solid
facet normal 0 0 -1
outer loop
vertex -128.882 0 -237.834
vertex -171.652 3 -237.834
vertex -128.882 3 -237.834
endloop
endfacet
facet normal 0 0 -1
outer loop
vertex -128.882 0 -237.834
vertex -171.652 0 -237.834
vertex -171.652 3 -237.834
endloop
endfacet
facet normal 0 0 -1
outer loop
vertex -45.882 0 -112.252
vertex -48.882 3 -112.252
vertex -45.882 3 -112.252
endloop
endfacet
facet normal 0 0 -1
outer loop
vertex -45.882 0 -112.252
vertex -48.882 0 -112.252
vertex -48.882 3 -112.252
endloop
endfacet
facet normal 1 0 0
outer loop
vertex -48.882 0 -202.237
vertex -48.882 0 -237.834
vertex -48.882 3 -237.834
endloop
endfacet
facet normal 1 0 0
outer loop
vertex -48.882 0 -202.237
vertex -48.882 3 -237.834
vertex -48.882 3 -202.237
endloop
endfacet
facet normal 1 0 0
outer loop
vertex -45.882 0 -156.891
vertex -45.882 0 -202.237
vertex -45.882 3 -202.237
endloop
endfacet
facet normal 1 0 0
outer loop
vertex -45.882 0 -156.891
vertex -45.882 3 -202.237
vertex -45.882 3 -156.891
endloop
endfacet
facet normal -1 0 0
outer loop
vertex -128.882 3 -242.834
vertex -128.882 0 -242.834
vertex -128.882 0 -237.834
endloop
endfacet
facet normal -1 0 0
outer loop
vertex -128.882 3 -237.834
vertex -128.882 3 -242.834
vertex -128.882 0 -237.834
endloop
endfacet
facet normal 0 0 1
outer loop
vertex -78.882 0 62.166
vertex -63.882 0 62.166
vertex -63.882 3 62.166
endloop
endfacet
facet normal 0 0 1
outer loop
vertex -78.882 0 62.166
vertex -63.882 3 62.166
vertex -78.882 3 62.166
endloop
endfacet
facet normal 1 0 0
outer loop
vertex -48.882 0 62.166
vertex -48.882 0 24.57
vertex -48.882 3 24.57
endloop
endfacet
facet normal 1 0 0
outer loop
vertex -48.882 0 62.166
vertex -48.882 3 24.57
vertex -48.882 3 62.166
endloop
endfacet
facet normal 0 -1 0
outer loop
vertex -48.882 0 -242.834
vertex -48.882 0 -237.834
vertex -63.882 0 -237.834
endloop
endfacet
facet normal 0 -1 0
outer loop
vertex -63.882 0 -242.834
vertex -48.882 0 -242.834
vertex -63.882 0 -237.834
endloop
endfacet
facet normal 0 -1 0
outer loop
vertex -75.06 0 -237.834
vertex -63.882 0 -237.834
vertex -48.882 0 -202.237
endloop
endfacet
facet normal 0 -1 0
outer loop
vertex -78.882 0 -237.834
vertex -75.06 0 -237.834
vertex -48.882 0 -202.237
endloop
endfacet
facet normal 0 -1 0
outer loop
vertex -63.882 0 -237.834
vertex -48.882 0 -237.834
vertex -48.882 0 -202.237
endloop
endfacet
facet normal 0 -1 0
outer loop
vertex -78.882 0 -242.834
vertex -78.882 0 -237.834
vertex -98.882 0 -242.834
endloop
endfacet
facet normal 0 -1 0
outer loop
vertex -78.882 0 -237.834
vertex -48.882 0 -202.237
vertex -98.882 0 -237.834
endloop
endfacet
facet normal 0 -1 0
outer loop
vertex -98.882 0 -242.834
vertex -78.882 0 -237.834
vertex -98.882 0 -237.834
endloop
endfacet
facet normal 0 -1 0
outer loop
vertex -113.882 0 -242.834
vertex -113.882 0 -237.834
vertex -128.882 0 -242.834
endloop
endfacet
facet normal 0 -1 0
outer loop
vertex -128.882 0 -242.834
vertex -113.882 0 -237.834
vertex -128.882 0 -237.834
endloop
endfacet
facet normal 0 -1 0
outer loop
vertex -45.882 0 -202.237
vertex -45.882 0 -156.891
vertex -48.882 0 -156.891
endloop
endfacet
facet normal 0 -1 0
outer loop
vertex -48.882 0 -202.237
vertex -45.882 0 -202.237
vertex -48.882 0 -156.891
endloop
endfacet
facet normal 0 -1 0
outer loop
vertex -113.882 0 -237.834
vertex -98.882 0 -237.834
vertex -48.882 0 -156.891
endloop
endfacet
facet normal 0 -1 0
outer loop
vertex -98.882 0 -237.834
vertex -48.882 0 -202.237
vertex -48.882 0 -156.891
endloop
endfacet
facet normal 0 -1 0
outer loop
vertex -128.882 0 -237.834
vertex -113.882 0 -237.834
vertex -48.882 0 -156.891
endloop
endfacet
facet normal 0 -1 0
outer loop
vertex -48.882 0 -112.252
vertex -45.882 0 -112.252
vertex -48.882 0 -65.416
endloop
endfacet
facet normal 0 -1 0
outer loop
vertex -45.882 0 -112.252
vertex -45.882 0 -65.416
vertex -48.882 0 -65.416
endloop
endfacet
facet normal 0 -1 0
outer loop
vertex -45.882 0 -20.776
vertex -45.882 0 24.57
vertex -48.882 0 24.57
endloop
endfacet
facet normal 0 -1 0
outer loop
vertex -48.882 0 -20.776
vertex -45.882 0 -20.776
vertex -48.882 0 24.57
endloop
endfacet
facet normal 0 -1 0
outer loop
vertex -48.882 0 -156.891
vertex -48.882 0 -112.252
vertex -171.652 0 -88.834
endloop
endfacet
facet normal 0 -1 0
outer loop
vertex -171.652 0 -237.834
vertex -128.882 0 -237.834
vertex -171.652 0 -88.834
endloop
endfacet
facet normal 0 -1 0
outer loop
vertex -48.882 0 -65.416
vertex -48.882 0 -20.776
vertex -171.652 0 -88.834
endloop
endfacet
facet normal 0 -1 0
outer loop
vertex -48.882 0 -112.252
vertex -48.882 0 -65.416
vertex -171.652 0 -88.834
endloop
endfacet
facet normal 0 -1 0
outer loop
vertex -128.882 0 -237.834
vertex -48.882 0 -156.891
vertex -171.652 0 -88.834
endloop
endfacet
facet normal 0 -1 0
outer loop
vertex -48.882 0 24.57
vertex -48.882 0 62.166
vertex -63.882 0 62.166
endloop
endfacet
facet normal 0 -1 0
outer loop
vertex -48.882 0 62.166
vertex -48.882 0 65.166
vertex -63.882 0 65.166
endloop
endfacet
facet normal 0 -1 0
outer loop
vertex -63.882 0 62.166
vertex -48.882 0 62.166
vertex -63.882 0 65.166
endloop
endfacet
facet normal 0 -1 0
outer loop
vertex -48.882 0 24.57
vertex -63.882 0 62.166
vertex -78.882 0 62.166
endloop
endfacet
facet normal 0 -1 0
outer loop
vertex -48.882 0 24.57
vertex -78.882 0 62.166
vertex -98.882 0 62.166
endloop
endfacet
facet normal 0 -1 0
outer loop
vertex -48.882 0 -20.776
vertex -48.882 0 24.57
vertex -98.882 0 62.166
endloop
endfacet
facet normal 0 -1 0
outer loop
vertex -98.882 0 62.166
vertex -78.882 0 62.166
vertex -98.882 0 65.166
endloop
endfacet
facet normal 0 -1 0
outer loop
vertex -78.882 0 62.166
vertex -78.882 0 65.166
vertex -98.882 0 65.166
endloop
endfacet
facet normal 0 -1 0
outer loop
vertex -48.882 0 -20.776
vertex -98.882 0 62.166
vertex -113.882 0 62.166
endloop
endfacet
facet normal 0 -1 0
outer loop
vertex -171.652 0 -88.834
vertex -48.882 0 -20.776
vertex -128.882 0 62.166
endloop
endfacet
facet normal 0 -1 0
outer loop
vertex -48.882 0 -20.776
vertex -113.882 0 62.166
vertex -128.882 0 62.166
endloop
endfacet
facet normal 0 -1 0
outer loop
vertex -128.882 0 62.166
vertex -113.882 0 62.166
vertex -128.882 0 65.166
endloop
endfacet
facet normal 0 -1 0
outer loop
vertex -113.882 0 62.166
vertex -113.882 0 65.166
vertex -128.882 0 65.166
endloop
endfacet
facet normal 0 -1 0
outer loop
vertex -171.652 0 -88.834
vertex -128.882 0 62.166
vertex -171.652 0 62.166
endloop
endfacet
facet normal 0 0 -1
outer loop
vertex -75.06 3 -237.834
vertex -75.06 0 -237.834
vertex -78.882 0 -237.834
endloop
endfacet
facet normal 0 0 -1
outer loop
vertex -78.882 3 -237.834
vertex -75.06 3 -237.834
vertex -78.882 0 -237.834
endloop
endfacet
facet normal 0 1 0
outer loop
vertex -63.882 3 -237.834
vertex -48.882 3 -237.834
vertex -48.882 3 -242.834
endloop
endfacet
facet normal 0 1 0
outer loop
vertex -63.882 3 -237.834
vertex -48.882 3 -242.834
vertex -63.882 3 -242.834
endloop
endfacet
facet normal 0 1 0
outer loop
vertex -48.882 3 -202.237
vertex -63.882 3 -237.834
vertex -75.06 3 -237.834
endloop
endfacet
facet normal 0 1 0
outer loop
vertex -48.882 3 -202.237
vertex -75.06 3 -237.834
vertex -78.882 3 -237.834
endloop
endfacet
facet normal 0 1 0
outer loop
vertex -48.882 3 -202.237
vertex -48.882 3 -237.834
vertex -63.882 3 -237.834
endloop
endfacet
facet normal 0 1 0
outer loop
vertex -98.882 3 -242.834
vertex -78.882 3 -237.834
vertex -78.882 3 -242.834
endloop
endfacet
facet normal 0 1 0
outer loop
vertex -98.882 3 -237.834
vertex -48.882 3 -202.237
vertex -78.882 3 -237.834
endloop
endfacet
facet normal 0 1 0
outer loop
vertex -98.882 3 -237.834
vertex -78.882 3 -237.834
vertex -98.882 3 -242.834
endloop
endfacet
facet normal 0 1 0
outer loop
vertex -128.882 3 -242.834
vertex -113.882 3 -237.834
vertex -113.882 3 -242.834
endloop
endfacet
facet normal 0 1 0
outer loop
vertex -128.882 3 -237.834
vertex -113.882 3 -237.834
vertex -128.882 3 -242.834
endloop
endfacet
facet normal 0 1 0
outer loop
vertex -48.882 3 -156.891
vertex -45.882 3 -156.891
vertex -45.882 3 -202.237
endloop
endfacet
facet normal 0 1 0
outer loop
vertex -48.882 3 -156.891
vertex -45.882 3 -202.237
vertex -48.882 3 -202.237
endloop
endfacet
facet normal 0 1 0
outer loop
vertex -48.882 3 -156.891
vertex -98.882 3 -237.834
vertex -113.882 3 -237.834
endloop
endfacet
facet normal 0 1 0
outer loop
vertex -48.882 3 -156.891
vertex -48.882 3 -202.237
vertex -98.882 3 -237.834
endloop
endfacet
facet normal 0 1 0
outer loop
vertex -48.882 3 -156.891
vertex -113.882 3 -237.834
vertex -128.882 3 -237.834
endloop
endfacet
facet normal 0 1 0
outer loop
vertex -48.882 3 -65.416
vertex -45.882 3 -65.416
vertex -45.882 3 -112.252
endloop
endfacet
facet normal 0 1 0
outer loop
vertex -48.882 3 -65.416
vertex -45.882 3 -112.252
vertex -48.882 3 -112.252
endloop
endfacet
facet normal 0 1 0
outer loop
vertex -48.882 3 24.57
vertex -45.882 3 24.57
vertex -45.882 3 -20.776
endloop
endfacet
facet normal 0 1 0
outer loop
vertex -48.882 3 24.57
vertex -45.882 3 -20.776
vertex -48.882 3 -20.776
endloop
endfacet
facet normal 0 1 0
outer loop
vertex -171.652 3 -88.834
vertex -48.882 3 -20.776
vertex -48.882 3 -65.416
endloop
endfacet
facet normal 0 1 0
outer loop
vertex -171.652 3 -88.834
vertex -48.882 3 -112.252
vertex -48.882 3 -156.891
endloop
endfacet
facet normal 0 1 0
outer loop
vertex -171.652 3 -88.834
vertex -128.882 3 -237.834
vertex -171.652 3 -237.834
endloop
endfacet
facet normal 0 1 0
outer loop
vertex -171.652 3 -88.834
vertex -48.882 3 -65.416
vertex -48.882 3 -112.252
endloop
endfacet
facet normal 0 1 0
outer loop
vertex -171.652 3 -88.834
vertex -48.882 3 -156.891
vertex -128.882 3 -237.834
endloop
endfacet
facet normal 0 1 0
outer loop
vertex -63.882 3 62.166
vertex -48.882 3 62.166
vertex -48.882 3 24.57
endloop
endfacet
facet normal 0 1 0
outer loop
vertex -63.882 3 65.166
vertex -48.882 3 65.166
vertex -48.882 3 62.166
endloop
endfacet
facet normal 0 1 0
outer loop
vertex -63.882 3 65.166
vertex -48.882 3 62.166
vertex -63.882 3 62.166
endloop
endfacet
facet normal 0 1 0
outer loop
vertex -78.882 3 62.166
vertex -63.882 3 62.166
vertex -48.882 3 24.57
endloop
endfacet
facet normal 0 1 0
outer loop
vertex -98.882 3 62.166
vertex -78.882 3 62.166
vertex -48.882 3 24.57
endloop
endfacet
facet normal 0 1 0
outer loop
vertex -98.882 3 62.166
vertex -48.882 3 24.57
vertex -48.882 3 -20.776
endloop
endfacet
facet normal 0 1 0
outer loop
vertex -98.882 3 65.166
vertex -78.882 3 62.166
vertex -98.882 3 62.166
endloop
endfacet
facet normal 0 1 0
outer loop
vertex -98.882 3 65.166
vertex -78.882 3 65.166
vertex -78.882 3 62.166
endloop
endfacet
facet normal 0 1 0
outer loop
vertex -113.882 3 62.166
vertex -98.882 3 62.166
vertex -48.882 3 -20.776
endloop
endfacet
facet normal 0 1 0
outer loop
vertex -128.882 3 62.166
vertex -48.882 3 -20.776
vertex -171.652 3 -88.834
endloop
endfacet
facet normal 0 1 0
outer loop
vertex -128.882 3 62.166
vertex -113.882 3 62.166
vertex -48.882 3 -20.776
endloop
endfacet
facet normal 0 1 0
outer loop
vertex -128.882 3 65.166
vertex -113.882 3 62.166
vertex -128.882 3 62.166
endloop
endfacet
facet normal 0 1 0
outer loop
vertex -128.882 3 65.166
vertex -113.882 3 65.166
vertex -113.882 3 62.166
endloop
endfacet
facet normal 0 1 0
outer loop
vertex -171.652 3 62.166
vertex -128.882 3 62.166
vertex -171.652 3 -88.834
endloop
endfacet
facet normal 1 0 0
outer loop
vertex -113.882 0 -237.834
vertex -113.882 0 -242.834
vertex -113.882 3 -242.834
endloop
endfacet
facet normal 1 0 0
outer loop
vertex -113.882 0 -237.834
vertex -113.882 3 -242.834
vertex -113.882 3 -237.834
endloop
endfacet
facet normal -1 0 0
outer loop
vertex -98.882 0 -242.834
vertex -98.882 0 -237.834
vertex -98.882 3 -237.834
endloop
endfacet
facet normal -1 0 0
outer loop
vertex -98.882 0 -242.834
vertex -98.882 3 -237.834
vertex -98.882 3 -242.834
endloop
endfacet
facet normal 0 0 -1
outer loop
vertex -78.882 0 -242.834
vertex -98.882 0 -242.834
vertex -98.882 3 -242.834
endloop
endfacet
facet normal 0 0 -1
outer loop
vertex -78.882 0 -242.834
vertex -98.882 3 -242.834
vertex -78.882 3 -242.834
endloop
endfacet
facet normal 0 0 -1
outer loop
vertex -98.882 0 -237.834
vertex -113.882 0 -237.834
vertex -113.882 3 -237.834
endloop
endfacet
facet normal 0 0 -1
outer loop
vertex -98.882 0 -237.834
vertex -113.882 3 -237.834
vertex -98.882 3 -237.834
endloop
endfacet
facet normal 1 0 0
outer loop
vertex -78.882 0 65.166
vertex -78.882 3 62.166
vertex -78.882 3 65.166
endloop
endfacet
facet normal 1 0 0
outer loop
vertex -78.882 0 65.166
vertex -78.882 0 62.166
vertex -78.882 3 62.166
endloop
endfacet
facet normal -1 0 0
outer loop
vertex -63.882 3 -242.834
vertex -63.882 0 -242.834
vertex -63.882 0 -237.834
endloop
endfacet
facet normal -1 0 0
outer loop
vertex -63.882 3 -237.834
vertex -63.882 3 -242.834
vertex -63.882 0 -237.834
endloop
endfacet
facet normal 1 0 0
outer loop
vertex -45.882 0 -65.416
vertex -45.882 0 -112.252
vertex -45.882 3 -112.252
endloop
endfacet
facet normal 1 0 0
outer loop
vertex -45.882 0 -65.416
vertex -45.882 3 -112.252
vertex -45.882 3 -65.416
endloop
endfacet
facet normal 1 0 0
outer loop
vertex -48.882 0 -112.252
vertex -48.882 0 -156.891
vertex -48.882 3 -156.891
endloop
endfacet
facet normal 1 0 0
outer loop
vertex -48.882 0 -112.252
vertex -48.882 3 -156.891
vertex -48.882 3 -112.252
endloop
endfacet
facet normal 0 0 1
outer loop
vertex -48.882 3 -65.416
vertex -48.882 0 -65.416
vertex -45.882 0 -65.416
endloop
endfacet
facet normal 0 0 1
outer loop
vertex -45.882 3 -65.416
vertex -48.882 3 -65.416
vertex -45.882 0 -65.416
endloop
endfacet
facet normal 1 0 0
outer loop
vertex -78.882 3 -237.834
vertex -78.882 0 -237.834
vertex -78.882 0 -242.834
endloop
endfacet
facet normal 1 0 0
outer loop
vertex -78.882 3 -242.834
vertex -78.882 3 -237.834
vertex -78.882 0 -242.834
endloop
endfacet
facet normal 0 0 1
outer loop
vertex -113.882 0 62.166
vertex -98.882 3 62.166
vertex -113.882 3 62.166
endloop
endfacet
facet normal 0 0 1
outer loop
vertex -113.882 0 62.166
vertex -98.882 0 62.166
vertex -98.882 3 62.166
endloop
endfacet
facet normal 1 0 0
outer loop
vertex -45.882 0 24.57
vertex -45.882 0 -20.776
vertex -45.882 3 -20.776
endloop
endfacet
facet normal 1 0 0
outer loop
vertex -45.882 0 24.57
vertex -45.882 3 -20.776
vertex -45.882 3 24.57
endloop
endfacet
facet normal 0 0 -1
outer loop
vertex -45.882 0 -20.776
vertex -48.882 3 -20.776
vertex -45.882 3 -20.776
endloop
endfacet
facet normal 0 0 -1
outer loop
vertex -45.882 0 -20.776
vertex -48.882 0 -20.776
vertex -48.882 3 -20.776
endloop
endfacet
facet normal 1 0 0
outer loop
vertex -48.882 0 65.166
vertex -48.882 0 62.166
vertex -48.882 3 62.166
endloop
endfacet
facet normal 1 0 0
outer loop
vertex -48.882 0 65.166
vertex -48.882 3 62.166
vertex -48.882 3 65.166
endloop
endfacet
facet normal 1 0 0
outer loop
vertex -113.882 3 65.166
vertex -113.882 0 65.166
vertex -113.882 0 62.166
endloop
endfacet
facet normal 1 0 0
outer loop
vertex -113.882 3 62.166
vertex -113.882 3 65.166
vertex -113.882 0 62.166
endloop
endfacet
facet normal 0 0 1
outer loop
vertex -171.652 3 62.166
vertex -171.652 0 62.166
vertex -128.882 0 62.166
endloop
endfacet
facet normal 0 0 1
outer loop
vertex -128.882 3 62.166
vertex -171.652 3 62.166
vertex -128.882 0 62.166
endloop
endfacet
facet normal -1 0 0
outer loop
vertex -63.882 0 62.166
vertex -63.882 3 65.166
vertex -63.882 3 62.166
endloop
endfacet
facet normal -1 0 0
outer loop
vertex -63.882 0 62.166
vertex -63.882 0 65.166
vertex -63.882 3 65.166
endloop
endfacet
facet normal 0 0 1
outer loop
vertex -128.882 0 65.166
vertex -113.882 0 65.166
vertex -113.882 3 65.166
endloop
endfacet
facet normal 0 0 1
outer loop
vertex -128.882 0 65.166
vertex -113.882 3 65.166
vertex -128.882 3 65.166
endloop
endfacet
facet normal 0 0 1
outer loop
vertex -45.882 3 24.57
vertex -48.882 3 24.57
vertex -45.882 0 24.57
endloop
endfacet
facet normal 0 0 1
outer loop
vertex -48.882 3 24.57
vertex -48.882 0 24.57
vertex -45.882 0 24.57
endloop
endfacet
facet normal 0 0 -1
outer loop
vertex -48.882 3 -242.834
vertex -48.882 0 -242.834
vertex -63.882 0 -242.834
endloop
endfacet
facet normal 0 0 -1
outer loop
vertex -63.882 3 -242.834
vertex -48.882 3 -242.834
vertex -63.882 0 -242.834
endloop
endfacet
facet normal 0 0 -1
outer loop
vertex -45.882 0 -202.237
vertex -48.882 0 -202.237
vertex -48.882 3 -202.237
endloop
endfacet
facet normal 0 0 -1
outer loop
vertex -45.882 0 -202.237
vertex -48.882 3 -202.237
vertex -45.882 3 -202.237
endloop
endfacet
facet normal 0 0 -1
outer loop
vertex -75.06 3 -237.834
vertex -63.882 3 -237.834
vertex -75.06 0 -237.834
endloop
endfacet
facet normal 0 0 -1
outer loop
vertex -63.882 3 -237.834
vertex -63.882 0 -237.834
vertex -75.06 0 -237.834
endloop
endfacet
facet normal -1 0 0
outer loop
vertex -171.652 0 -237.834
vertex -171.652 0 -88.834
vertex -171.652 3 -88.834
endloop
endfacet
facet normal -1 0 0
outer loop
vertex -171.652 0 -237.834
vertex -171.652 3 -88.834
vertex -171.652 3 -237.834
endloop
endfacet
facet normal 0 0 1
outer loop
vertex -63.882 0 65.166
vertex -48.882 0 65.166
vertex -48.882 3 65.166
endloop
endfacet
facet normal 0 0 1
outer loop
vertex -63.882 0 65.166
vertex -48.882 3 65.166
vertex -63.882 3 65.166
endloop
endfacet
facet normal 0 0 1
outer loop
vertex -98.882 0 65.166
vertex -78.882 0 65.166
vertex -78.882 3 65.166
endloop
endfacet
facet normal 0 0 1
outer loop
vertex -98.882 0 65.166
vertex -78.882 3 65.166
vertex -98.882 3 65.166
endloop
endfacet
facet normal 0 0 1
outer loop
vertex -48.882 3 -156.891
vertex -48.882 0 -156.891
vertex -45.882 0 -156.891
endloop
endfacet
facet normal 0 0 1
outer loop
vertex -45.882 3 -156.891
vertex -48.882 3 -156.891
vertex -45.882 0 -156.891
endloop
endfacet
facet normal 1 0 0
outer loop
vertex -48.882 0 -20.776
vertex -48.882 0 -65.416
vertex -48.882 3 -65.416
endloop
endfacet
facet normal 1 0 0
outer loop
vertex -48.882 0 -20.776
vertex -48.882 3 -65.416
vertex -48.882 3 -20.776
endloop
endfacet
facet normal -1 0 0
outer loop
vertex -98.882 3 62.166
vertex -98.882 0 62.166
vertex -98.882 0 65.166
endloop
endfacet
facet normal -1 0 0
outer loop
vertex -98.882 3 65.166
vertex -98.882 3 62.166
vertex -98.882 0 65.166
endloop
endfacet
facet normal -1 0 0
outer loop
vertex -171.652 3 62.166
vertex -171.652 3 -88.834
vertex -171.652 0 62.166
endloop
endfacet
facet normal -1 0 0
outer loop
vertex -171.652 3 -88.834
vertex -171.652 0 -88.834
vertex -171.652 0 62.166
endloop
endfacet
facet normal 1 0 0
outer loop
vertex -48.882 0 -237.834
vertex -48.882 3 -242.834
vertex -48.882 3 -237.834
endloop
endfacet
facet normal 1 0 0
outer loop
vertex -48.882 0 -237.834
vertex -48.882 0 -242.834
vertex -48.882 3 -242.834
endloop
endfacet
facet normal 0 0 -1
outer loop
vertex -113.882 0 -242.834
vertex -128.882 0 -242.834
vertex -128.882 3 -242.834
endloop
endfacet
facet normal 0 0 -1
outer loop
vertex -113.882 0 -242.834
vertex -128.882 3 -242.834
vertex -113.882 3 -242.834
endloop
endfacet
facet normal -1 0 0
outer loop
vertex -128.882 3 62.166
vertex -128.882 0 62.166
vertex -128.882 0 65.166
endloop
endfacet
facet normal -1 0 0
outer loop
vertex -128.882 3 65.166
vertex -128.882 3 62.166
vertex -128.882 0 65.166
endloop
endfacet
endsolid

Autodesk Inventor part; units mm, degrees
ref_plane "YZ Plane" through (0, 0, 0) normal (1, 0, 0) x (0, 1, 0)
ref_plane "XZ Plane" through (0, 0, 0) normal (0, 1, 0) x (-1, 0, 0)
ref_plane "XY Plane" through (0, 0, 0) normal (0, 0, 1) x (1, 0, 0)
sketch "Sketch1" plane through (0, 0, 0) normal (0, 1, 0) x (-1, 0, 0)
  point P0 (0, 0)
sketch "Sketch3" plane through (0, 0, 0) normal (0, 1, 0) x (-1, 0, 0)
  line L0 (113.8824, -237.8336) -> (98.8824, -237.8336)
  line L1 (128.8824, -242.8336) -> (113.8824, -242.8336)
  line L2 (128.8824, -242.8336) -> (128.8824, -237.8336)
  line L3 (98.8824, -237.8336) -> (98.8824, -242.8336)
  line L4 (113.8824, -242.8336) -> (113.8824, -237.8336)
  line L5 (48.8824, -156.8908) -> (45.8824, -156.8908)
  line L6 (48.8824, -156.8908) -> (48.8824, -112.2516)
  line L7 (48.8824, -112.2516) -> (45.8824, -112.2516)
  line L8 (45.8824, -112.2516) -> (45.8824, -65.4156)
  line L9 (48.8824, -65.4156) -> (45.8824, -65.4156)
  line L10 (48.8824, -156.8908) -> (48.8824, -112.2516)
  line L11 (98.8824, -242.8336) -> (78.8824, -242.8336)
  line L12 (63.8824, -237.8336) -> (75.0605, -237.8336)
  line L13 (48.8824, -237.8336) -> (48.8824, -202.2369)
  line L14 (48.8824, -202.2369) -> (45.8824, -202.2369)
  line L15 (45.8824, -202.2369) -> (45.8824, -156.8908)
  line L16 (48.8824, -20.7764) -> (45.8824, -20.7764)
  line L17 (45.8824, -20.7764) -> (45.8824, 24.5697)
  line L18 (48.8824, -65.4156) -> (48.8824, -20.7764)
  line L19 (48.8824, -65.4156) -> (48.8824, -20.7764)
  line L20 (48.8824, 24.5697) -> (45.8824, 24.5697)
  line L21 (113.8824, 65.1664) -> (113.8824, 62.1664)
  line L22 (48.8824, 24.5697) -> (48.8824, 62.1664)
  line L23 (48.8824, 24.5697) -> (48.8824, 65.1664)
  line L24 (48.8824, 65.1664) -> (63.8824, 65.1664)
  line L25 (63.8824, 62.1664) -> (78.8824, 62.1664)
  line L26 (63.8824, 65.1664) -> (63.8824, 62.1664)
  line L27 (78.8824, 62.1664) -> (78.8824, 65.1664)
  line L28 (78.8824, 65.1664) -> (98.8824, 65.1664)
  line L29 (98.8824, 62.1664) -> (98.8824, 65.1664)
  line L30 (98.8824, 62.1664) -> (113.8824, 62.1664)
  line L31 (128.8824, 62.1664) -> (128.8824, 65.1664)
  line L32 (113.8824, 65.1664) -> (128.8824, 65.1664)
  line L33 (63.8824, -237.8336) -> (78.8824, -237.8336)
  line L34 (48.8824, -242.8336) -> (48.8824, -237.8336)
  line L35 (48.8824, -242.8336) -> (63.8824, -242.8336)
  line L36 (63.8824, -242.8336) -> (63.8824, -237.8336)
  line L37 (78.8824, -237.8336) -> (78.8824, -242.8336)
  line L38 (78.8824, -237.8336) -> (63.8824, -237.8336)
  line L39 (171.6524, -88.8336) -> (171.6524, -237.8336)
  line L40 (171.6524, -237.8336) -> (128.8824, -237.8336)
  line L41 (171.6524, -88.8336) -> (171.6524, 62.1664)
  line L42 (171.6524, 62.1664) -> (128.8824, 62.1664)
  point P0 (0, 0)
  point P1 (0, 0)
  point P2 (106.3824, -237.8336)
  point P3 (47.3824, -202.2369)
  point P4 (0, 0)
  point P5 (106.3824, 62.1664)
  point P6 (121.3824, 65.1664)
  dimension "d54" = 80
  dimension "d55" = 15
  dimension "d56" = 15
  dimension "d57" = 300
  dimension "d58" = 3
  dimension "d59" = 5
  dimension "d60" = 44.6392
  dimension "d61" = 37.5967
  dimension "d62" = 44.6392
  dimension "d63" = 40.5967
  dimension "d64" = 45.3461
  dimension "d66" = 45.3461
  dimension "d67" = 20
  dimension "d68" = 15
  dimension "d69" = 15
  dimension "d70" = 15
  dimension "d71" = 15
  dimension "d72" = 15
  dimension "d73" = 15
  dimension "d74" = 20
  dimension "d75" = 308
extrude "Extrusion2" add sketch "Sketch3" along normal blind 3
properties part number "mieng_ben_3mm"
